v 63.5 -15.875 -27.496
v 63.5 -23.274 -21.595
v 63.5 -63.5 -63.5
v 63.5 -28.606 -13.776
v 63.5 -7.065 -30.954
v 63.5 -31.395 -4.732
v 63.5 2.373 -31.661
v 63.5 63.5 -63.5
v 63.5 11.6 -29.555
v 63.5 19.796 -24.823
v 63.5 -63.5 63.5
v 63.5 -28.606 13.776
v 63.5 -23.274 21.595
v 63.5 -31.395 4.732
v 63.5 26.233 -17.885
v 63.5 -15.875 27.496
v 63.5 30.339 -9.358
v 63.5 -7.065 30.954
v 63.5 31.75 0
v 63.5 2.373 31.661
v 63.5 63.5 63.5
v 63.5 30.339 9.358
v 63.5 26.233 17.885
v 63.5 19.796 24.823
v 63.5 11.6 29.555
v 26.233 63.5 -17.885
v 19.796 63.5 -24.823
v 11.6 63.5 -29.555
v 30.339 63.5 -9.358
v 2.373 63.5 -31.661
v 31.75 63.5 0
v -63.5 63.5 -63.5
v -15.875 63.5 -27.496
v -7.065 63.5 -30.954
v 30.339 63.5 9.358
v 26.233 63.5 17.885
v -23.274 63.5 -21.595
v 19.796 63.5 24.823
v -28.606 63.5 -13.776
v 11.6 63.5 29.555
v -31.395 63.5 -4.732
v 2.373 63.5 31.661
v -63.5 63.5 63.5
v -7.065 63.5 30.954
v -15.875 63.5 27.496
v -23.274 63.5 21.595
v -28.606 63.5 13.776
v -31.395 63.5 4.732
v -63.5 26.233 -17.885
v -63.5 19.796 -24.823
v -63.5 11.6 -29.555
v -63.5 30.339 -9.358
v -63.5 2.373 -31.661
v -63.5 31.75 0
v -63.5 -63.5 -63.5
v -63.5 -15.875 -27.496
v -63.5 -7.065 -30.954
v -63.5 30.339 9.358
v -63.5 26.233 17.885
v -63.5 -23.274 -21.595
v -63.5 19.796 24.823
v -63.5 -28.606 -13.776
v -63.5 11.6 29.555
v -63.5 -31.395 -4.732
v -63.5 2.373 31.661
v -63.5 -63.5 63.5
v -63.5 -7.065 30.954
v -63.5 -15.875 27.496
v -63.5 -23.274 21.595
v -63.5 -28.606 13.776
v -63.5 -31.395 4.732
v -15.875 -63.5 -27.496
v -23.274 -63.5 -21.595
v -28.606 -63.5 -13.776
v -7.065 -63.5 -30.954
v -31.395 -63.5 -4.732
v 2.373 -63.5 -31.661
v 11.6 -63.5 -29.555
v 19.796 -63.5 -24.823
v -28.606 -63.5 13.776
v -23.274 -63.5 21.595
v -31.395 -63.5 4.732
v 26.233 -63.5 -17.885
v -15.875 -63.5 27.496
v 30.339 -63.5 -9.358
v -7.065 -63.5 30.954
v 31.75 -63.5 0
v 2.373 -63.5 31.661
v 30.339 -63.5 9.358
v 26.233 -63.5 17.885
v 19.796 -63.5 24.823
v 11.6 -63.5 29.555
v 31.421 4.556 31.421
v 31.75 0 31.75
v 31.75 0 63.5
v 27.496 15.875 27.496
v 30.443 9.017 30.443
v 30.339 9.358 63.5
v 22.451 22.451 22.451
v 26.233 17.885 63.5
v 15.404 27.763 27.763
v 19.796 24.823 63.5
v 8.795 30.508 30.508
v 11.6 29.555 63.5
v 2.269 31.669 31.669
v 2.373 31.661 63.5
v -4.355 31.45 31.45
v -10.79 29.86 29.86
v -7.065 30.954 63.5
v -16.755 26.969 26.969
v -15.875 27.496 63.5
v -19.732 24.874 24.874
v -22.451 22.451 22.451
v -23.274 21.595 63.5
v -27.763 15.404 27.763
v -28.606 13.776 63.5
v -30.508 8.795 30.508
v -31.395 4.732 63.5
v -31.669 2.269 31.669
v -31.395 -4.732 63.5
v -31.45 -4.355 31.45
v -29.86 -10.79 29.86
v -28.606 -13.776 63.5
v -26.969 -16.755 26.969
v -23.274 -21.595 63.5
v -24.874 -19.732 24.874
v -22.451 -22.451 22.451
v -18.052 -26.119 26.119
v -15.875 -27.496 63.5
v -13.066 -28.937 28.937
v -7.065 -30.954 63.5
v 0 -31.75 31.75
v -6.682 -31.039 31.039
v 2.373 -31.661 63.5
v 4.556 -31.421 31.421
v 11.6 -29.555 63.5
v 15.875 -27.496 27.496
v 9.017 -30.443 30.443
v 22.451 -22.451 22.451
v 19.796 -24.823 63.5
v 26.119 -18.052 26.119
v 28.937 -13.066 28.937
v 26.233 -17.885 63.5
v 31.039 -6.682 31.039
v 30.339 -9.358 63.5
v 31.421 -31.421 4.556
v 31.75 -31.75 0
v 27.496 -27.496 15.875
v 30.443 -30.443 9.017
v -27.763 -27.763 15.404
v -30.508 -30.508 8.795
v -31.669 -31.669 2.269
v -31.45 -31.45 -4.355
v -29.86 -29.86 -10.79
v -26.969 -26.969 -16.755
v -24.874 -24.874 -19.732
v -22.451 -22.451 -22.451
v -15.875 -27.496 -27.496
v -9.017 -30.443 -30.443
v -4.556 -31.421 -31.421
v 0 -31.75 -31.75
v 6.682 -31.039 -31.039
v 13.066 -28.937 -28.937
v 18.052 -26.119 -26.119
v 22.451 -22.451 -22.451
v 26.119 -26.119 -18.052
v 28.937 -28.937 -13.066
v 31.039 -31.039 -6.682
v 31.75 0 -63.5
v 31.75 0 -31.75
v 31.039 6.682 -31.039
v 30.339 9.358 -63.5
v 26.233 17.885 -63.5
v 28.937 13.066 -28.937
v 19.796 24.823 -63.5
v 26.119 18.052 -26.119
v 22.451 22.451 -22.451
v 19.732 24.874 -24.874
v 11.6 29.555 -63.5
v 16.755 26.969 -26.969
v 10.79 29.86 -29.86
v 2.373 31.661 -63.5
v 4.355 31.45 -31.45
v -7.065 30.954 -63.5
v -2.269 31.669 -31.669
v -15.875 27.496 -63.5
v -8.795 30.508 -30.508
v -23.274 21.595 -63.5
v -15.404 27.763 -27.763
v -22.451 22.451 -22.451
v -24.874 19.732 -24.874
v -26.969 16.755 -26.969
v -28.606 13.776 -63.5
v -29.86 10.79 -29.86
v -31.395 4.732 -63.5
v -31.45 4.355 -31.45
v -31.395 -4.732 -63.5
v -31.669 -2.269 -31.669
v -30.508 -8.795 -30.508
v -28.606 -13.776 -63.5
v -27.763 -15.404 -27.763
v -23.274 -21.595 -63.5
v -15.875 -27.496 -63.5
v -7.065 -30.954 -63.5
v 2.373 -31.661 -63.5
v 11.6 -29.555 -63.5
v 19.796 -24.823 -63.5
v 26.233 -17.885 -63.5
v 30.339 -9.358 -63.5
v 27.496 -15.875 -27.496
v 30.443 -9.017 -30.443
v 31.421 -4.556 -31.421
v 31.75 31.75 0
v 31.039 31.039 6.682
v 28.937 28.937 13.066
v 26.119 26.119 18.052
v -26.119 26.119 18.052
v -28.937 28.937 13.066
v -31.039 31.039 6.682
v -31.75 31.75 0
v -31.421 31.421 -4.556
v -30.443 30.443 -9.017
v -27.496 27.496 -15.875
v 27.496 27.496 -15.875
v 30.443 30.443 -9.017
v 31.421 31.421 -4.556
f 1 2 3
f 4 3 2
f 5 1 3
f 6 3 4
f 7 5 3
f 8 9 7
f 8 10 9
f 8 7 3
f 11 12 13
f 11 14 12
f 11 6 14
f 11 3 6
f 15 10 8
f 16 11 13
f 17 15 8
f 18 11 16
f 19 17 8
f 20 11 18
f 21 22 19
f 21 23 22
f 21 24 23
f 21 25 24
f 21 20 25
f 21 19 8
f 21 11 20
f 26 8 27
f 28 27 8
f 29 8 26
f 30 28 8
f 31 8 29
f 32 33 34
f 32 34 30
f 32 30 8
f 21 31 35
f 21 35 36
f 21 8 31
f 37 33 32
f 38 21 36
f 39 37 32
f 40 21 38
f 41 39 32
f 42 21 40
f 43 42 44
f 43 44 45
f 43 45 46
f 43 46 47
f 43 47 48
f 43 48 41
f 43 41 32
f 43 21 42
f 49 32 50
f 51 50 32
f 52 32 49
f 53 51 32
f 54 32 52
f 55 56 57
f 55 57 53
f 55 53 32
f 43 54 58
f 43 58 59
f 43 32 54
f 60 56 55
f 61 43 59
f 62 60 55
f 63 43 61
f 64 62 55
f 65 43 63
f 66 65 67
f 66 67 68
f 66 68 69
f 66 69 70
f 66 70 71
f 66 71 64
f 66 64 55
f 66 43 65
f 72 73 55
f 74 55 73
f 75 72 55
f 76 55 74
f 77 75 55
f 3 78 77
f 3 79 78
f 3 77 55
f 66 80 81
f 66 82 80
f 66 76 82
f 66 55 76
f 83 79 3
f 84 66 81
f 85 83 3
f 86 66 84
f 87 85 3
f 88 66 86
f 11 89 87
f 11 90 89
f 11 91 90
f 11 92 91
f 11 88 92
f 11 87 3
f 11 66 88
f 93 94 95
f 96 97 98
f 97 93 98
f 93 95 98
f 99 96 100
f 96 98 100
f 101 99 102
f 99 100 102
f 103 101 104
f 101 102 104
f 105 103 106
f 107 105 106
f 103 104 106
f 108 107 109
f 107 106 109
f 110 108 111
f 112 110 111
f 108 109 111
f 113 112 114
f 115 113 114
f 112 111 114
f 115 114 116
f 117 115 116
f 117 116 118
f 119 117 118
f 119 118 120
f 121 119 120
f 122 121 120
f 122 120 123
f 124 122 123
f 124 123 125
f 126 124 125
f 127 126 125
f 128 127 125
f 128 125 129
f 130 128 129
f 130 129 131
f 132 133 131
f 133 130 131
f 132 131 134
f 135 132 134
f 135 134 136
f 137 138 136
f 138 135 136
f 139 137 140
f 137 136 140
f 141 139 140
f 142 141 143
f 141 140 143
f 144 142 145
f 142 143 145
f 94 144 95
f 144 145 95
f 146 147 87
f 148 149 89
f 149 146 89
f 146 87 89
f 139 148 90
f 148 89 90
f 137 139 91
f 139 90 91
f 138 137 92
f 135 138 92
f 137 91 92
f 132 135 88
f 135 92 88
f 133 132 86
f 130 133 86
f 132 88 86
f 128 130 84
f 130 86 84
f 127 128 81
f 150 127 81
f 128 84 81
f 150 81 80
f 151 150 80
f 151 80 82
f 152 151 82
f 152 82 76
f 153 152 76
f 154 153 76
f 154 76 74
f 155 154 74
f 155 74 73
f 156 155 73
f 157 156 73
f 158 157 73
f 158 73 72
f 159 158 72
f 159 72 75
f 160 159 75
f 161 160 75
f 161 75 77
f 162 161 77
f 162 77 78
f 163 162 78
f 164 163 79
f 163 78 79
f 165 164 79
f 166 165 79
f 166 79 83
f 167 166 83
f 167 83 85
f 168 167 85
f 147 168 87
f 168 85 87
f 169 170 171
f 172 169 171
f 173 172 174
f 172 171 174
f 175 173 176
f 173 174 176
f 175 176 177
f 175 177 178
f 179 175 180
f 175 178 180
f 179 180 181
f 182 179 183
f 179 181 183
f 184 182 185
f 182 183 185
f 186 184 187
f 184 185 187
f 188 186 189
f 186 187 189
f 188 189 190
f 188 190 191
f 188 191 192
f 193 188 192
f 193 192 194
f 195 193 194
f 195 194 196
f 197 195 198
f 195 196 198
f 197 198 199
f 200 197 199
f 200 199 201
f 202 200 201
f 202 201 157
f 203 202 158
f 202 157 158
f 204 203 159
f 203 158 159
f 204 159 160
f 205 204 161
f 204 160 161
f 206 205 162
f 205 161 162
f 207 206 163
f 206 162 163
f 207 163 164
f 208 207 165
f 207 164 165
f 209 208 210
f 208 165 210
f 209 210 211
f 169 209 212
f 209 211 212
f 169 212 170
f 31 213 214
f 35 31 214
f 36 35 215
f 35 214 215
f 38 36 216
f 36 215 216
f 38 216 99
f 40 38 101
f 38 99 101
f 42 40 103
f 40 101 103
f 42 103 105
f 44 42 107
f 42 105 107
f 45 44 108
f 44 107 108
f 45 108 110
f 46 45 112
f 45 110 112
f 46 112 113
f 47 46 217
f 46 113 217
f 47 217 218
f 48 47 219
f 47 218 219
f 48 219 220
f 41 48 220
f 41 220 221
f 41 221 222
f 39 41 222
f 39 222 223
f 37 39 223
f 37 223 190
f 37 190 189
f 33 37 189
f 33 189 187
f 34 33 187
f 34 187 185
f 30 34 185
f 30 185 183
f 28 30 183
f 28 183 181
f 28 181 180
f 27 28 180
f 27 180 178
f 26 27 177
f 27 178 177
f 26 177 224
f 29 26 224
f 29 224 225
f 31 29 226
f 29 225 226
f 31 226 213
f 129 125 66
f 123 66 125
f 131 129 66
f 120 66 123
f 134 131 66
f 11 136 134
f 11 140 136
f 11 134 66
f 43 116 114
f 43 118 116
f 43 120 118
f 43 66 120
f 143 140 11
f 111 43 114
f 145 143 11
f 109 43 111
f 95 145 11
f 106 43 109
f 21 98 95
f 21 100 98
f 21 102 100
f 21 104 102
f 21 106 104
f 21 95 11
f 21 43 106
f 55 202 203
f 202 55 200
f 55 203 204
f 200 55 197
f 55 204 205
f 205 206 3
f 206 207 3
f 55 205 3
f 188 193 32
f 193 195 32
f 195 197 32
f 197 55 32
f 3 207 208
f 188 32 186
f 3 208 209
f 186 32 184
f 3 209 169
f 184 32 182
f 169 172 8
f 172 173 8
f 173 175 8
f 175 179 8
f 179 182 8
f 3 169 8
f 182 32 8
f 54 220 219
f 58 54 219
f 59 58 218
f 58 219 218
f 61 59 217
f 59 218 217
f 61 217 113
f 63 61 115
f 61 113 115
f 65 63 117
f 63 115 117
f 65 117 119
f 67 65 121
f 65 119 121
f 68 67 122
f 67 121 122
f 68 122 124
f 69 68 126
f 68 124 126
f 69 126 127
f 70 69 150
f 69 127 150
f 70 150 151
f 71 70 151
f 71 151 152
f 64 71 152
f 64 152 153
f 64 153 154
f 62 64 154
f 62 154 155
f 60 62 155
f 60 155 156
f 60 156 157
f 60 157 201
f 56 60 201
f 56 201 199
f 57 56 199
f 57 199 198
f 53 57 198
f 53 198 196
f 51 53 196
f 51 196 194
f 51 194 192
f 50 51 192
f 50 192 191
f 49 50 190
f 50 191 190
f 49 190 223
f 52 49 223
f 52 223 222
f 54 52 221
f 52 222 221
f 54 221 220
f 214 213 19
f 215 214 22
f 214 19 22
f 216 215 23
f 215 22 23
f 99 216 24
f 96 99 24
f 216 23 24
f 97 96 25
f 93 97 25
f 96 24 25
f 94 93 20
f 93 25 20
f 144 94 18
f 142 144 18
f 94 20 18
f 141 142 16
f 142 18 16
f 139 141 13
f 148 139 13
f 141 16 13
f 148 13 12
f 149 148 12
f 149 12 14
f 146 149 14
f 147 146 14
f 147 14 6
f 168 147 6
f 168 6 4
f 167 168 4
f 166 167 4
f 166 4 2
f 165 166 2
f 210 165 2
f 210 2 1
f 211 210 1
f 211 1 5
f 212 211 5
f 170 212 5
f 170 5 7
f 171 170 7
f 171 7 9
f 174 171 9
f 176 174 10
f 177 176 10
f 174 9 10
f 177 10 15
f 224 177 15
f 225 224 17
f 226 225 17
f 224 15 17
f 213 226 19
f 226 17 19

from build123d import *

# Parameters (mm, degrees)
F0_W     = 63.5
F0_H     = 63.5
F1_DEPTH = 63.5
F2_R     = 31.75
F3_DEPTH = 127.001
F4_R     = 31.75
F5_DEPTH = 127.001
F6_R     = 31.75
F7_DEPTH = 127.001


with BuildPart() as f1:
    # F0 (on Top) → F1 (new body, symmetric)
    with BuildSketch(Plane.XY):
        with Locations((-31.75, 31.75)):
            Rectangle(F0_W, F0_H)
        with Locations((-31.75, -31.75)):
            Rectangle(F0_W, F0_H)
        with Locations((31.75, -31.75)):
            Rectangle(F0_W, F0_H)
        with Locations((31.75, 31.75)):
            Rectangle(F0_W, F0_H)
    extrude(amount=F1_DEPTH, both=True)

    # F2 (on face) → F3 (cut, through all)
    with BuildSketch(Plane.YZ.offset(63.5)):
        Circle(F2_R)
    extrude(amount=-F3_DEPTH, mode=Mode.SUBTRACT)

    # F4 (on face) → F5 (cut, through all)
    with BuildSketch(Plane.XZ.offset(63.5)):
        Circle(F4_R)
    extrude(amount=-F5_DEPTH, mode=Mode.SUBTRACT)

    # F6 (on face) → F7 (cut, through all)
    with BuildSketch(Plane.XY.offset(63.5)):
        Circle(F6_R)
    extrude(amount=-F7_DEPTH, mode=Mode.SUBTRACT)


solid = f1.part
